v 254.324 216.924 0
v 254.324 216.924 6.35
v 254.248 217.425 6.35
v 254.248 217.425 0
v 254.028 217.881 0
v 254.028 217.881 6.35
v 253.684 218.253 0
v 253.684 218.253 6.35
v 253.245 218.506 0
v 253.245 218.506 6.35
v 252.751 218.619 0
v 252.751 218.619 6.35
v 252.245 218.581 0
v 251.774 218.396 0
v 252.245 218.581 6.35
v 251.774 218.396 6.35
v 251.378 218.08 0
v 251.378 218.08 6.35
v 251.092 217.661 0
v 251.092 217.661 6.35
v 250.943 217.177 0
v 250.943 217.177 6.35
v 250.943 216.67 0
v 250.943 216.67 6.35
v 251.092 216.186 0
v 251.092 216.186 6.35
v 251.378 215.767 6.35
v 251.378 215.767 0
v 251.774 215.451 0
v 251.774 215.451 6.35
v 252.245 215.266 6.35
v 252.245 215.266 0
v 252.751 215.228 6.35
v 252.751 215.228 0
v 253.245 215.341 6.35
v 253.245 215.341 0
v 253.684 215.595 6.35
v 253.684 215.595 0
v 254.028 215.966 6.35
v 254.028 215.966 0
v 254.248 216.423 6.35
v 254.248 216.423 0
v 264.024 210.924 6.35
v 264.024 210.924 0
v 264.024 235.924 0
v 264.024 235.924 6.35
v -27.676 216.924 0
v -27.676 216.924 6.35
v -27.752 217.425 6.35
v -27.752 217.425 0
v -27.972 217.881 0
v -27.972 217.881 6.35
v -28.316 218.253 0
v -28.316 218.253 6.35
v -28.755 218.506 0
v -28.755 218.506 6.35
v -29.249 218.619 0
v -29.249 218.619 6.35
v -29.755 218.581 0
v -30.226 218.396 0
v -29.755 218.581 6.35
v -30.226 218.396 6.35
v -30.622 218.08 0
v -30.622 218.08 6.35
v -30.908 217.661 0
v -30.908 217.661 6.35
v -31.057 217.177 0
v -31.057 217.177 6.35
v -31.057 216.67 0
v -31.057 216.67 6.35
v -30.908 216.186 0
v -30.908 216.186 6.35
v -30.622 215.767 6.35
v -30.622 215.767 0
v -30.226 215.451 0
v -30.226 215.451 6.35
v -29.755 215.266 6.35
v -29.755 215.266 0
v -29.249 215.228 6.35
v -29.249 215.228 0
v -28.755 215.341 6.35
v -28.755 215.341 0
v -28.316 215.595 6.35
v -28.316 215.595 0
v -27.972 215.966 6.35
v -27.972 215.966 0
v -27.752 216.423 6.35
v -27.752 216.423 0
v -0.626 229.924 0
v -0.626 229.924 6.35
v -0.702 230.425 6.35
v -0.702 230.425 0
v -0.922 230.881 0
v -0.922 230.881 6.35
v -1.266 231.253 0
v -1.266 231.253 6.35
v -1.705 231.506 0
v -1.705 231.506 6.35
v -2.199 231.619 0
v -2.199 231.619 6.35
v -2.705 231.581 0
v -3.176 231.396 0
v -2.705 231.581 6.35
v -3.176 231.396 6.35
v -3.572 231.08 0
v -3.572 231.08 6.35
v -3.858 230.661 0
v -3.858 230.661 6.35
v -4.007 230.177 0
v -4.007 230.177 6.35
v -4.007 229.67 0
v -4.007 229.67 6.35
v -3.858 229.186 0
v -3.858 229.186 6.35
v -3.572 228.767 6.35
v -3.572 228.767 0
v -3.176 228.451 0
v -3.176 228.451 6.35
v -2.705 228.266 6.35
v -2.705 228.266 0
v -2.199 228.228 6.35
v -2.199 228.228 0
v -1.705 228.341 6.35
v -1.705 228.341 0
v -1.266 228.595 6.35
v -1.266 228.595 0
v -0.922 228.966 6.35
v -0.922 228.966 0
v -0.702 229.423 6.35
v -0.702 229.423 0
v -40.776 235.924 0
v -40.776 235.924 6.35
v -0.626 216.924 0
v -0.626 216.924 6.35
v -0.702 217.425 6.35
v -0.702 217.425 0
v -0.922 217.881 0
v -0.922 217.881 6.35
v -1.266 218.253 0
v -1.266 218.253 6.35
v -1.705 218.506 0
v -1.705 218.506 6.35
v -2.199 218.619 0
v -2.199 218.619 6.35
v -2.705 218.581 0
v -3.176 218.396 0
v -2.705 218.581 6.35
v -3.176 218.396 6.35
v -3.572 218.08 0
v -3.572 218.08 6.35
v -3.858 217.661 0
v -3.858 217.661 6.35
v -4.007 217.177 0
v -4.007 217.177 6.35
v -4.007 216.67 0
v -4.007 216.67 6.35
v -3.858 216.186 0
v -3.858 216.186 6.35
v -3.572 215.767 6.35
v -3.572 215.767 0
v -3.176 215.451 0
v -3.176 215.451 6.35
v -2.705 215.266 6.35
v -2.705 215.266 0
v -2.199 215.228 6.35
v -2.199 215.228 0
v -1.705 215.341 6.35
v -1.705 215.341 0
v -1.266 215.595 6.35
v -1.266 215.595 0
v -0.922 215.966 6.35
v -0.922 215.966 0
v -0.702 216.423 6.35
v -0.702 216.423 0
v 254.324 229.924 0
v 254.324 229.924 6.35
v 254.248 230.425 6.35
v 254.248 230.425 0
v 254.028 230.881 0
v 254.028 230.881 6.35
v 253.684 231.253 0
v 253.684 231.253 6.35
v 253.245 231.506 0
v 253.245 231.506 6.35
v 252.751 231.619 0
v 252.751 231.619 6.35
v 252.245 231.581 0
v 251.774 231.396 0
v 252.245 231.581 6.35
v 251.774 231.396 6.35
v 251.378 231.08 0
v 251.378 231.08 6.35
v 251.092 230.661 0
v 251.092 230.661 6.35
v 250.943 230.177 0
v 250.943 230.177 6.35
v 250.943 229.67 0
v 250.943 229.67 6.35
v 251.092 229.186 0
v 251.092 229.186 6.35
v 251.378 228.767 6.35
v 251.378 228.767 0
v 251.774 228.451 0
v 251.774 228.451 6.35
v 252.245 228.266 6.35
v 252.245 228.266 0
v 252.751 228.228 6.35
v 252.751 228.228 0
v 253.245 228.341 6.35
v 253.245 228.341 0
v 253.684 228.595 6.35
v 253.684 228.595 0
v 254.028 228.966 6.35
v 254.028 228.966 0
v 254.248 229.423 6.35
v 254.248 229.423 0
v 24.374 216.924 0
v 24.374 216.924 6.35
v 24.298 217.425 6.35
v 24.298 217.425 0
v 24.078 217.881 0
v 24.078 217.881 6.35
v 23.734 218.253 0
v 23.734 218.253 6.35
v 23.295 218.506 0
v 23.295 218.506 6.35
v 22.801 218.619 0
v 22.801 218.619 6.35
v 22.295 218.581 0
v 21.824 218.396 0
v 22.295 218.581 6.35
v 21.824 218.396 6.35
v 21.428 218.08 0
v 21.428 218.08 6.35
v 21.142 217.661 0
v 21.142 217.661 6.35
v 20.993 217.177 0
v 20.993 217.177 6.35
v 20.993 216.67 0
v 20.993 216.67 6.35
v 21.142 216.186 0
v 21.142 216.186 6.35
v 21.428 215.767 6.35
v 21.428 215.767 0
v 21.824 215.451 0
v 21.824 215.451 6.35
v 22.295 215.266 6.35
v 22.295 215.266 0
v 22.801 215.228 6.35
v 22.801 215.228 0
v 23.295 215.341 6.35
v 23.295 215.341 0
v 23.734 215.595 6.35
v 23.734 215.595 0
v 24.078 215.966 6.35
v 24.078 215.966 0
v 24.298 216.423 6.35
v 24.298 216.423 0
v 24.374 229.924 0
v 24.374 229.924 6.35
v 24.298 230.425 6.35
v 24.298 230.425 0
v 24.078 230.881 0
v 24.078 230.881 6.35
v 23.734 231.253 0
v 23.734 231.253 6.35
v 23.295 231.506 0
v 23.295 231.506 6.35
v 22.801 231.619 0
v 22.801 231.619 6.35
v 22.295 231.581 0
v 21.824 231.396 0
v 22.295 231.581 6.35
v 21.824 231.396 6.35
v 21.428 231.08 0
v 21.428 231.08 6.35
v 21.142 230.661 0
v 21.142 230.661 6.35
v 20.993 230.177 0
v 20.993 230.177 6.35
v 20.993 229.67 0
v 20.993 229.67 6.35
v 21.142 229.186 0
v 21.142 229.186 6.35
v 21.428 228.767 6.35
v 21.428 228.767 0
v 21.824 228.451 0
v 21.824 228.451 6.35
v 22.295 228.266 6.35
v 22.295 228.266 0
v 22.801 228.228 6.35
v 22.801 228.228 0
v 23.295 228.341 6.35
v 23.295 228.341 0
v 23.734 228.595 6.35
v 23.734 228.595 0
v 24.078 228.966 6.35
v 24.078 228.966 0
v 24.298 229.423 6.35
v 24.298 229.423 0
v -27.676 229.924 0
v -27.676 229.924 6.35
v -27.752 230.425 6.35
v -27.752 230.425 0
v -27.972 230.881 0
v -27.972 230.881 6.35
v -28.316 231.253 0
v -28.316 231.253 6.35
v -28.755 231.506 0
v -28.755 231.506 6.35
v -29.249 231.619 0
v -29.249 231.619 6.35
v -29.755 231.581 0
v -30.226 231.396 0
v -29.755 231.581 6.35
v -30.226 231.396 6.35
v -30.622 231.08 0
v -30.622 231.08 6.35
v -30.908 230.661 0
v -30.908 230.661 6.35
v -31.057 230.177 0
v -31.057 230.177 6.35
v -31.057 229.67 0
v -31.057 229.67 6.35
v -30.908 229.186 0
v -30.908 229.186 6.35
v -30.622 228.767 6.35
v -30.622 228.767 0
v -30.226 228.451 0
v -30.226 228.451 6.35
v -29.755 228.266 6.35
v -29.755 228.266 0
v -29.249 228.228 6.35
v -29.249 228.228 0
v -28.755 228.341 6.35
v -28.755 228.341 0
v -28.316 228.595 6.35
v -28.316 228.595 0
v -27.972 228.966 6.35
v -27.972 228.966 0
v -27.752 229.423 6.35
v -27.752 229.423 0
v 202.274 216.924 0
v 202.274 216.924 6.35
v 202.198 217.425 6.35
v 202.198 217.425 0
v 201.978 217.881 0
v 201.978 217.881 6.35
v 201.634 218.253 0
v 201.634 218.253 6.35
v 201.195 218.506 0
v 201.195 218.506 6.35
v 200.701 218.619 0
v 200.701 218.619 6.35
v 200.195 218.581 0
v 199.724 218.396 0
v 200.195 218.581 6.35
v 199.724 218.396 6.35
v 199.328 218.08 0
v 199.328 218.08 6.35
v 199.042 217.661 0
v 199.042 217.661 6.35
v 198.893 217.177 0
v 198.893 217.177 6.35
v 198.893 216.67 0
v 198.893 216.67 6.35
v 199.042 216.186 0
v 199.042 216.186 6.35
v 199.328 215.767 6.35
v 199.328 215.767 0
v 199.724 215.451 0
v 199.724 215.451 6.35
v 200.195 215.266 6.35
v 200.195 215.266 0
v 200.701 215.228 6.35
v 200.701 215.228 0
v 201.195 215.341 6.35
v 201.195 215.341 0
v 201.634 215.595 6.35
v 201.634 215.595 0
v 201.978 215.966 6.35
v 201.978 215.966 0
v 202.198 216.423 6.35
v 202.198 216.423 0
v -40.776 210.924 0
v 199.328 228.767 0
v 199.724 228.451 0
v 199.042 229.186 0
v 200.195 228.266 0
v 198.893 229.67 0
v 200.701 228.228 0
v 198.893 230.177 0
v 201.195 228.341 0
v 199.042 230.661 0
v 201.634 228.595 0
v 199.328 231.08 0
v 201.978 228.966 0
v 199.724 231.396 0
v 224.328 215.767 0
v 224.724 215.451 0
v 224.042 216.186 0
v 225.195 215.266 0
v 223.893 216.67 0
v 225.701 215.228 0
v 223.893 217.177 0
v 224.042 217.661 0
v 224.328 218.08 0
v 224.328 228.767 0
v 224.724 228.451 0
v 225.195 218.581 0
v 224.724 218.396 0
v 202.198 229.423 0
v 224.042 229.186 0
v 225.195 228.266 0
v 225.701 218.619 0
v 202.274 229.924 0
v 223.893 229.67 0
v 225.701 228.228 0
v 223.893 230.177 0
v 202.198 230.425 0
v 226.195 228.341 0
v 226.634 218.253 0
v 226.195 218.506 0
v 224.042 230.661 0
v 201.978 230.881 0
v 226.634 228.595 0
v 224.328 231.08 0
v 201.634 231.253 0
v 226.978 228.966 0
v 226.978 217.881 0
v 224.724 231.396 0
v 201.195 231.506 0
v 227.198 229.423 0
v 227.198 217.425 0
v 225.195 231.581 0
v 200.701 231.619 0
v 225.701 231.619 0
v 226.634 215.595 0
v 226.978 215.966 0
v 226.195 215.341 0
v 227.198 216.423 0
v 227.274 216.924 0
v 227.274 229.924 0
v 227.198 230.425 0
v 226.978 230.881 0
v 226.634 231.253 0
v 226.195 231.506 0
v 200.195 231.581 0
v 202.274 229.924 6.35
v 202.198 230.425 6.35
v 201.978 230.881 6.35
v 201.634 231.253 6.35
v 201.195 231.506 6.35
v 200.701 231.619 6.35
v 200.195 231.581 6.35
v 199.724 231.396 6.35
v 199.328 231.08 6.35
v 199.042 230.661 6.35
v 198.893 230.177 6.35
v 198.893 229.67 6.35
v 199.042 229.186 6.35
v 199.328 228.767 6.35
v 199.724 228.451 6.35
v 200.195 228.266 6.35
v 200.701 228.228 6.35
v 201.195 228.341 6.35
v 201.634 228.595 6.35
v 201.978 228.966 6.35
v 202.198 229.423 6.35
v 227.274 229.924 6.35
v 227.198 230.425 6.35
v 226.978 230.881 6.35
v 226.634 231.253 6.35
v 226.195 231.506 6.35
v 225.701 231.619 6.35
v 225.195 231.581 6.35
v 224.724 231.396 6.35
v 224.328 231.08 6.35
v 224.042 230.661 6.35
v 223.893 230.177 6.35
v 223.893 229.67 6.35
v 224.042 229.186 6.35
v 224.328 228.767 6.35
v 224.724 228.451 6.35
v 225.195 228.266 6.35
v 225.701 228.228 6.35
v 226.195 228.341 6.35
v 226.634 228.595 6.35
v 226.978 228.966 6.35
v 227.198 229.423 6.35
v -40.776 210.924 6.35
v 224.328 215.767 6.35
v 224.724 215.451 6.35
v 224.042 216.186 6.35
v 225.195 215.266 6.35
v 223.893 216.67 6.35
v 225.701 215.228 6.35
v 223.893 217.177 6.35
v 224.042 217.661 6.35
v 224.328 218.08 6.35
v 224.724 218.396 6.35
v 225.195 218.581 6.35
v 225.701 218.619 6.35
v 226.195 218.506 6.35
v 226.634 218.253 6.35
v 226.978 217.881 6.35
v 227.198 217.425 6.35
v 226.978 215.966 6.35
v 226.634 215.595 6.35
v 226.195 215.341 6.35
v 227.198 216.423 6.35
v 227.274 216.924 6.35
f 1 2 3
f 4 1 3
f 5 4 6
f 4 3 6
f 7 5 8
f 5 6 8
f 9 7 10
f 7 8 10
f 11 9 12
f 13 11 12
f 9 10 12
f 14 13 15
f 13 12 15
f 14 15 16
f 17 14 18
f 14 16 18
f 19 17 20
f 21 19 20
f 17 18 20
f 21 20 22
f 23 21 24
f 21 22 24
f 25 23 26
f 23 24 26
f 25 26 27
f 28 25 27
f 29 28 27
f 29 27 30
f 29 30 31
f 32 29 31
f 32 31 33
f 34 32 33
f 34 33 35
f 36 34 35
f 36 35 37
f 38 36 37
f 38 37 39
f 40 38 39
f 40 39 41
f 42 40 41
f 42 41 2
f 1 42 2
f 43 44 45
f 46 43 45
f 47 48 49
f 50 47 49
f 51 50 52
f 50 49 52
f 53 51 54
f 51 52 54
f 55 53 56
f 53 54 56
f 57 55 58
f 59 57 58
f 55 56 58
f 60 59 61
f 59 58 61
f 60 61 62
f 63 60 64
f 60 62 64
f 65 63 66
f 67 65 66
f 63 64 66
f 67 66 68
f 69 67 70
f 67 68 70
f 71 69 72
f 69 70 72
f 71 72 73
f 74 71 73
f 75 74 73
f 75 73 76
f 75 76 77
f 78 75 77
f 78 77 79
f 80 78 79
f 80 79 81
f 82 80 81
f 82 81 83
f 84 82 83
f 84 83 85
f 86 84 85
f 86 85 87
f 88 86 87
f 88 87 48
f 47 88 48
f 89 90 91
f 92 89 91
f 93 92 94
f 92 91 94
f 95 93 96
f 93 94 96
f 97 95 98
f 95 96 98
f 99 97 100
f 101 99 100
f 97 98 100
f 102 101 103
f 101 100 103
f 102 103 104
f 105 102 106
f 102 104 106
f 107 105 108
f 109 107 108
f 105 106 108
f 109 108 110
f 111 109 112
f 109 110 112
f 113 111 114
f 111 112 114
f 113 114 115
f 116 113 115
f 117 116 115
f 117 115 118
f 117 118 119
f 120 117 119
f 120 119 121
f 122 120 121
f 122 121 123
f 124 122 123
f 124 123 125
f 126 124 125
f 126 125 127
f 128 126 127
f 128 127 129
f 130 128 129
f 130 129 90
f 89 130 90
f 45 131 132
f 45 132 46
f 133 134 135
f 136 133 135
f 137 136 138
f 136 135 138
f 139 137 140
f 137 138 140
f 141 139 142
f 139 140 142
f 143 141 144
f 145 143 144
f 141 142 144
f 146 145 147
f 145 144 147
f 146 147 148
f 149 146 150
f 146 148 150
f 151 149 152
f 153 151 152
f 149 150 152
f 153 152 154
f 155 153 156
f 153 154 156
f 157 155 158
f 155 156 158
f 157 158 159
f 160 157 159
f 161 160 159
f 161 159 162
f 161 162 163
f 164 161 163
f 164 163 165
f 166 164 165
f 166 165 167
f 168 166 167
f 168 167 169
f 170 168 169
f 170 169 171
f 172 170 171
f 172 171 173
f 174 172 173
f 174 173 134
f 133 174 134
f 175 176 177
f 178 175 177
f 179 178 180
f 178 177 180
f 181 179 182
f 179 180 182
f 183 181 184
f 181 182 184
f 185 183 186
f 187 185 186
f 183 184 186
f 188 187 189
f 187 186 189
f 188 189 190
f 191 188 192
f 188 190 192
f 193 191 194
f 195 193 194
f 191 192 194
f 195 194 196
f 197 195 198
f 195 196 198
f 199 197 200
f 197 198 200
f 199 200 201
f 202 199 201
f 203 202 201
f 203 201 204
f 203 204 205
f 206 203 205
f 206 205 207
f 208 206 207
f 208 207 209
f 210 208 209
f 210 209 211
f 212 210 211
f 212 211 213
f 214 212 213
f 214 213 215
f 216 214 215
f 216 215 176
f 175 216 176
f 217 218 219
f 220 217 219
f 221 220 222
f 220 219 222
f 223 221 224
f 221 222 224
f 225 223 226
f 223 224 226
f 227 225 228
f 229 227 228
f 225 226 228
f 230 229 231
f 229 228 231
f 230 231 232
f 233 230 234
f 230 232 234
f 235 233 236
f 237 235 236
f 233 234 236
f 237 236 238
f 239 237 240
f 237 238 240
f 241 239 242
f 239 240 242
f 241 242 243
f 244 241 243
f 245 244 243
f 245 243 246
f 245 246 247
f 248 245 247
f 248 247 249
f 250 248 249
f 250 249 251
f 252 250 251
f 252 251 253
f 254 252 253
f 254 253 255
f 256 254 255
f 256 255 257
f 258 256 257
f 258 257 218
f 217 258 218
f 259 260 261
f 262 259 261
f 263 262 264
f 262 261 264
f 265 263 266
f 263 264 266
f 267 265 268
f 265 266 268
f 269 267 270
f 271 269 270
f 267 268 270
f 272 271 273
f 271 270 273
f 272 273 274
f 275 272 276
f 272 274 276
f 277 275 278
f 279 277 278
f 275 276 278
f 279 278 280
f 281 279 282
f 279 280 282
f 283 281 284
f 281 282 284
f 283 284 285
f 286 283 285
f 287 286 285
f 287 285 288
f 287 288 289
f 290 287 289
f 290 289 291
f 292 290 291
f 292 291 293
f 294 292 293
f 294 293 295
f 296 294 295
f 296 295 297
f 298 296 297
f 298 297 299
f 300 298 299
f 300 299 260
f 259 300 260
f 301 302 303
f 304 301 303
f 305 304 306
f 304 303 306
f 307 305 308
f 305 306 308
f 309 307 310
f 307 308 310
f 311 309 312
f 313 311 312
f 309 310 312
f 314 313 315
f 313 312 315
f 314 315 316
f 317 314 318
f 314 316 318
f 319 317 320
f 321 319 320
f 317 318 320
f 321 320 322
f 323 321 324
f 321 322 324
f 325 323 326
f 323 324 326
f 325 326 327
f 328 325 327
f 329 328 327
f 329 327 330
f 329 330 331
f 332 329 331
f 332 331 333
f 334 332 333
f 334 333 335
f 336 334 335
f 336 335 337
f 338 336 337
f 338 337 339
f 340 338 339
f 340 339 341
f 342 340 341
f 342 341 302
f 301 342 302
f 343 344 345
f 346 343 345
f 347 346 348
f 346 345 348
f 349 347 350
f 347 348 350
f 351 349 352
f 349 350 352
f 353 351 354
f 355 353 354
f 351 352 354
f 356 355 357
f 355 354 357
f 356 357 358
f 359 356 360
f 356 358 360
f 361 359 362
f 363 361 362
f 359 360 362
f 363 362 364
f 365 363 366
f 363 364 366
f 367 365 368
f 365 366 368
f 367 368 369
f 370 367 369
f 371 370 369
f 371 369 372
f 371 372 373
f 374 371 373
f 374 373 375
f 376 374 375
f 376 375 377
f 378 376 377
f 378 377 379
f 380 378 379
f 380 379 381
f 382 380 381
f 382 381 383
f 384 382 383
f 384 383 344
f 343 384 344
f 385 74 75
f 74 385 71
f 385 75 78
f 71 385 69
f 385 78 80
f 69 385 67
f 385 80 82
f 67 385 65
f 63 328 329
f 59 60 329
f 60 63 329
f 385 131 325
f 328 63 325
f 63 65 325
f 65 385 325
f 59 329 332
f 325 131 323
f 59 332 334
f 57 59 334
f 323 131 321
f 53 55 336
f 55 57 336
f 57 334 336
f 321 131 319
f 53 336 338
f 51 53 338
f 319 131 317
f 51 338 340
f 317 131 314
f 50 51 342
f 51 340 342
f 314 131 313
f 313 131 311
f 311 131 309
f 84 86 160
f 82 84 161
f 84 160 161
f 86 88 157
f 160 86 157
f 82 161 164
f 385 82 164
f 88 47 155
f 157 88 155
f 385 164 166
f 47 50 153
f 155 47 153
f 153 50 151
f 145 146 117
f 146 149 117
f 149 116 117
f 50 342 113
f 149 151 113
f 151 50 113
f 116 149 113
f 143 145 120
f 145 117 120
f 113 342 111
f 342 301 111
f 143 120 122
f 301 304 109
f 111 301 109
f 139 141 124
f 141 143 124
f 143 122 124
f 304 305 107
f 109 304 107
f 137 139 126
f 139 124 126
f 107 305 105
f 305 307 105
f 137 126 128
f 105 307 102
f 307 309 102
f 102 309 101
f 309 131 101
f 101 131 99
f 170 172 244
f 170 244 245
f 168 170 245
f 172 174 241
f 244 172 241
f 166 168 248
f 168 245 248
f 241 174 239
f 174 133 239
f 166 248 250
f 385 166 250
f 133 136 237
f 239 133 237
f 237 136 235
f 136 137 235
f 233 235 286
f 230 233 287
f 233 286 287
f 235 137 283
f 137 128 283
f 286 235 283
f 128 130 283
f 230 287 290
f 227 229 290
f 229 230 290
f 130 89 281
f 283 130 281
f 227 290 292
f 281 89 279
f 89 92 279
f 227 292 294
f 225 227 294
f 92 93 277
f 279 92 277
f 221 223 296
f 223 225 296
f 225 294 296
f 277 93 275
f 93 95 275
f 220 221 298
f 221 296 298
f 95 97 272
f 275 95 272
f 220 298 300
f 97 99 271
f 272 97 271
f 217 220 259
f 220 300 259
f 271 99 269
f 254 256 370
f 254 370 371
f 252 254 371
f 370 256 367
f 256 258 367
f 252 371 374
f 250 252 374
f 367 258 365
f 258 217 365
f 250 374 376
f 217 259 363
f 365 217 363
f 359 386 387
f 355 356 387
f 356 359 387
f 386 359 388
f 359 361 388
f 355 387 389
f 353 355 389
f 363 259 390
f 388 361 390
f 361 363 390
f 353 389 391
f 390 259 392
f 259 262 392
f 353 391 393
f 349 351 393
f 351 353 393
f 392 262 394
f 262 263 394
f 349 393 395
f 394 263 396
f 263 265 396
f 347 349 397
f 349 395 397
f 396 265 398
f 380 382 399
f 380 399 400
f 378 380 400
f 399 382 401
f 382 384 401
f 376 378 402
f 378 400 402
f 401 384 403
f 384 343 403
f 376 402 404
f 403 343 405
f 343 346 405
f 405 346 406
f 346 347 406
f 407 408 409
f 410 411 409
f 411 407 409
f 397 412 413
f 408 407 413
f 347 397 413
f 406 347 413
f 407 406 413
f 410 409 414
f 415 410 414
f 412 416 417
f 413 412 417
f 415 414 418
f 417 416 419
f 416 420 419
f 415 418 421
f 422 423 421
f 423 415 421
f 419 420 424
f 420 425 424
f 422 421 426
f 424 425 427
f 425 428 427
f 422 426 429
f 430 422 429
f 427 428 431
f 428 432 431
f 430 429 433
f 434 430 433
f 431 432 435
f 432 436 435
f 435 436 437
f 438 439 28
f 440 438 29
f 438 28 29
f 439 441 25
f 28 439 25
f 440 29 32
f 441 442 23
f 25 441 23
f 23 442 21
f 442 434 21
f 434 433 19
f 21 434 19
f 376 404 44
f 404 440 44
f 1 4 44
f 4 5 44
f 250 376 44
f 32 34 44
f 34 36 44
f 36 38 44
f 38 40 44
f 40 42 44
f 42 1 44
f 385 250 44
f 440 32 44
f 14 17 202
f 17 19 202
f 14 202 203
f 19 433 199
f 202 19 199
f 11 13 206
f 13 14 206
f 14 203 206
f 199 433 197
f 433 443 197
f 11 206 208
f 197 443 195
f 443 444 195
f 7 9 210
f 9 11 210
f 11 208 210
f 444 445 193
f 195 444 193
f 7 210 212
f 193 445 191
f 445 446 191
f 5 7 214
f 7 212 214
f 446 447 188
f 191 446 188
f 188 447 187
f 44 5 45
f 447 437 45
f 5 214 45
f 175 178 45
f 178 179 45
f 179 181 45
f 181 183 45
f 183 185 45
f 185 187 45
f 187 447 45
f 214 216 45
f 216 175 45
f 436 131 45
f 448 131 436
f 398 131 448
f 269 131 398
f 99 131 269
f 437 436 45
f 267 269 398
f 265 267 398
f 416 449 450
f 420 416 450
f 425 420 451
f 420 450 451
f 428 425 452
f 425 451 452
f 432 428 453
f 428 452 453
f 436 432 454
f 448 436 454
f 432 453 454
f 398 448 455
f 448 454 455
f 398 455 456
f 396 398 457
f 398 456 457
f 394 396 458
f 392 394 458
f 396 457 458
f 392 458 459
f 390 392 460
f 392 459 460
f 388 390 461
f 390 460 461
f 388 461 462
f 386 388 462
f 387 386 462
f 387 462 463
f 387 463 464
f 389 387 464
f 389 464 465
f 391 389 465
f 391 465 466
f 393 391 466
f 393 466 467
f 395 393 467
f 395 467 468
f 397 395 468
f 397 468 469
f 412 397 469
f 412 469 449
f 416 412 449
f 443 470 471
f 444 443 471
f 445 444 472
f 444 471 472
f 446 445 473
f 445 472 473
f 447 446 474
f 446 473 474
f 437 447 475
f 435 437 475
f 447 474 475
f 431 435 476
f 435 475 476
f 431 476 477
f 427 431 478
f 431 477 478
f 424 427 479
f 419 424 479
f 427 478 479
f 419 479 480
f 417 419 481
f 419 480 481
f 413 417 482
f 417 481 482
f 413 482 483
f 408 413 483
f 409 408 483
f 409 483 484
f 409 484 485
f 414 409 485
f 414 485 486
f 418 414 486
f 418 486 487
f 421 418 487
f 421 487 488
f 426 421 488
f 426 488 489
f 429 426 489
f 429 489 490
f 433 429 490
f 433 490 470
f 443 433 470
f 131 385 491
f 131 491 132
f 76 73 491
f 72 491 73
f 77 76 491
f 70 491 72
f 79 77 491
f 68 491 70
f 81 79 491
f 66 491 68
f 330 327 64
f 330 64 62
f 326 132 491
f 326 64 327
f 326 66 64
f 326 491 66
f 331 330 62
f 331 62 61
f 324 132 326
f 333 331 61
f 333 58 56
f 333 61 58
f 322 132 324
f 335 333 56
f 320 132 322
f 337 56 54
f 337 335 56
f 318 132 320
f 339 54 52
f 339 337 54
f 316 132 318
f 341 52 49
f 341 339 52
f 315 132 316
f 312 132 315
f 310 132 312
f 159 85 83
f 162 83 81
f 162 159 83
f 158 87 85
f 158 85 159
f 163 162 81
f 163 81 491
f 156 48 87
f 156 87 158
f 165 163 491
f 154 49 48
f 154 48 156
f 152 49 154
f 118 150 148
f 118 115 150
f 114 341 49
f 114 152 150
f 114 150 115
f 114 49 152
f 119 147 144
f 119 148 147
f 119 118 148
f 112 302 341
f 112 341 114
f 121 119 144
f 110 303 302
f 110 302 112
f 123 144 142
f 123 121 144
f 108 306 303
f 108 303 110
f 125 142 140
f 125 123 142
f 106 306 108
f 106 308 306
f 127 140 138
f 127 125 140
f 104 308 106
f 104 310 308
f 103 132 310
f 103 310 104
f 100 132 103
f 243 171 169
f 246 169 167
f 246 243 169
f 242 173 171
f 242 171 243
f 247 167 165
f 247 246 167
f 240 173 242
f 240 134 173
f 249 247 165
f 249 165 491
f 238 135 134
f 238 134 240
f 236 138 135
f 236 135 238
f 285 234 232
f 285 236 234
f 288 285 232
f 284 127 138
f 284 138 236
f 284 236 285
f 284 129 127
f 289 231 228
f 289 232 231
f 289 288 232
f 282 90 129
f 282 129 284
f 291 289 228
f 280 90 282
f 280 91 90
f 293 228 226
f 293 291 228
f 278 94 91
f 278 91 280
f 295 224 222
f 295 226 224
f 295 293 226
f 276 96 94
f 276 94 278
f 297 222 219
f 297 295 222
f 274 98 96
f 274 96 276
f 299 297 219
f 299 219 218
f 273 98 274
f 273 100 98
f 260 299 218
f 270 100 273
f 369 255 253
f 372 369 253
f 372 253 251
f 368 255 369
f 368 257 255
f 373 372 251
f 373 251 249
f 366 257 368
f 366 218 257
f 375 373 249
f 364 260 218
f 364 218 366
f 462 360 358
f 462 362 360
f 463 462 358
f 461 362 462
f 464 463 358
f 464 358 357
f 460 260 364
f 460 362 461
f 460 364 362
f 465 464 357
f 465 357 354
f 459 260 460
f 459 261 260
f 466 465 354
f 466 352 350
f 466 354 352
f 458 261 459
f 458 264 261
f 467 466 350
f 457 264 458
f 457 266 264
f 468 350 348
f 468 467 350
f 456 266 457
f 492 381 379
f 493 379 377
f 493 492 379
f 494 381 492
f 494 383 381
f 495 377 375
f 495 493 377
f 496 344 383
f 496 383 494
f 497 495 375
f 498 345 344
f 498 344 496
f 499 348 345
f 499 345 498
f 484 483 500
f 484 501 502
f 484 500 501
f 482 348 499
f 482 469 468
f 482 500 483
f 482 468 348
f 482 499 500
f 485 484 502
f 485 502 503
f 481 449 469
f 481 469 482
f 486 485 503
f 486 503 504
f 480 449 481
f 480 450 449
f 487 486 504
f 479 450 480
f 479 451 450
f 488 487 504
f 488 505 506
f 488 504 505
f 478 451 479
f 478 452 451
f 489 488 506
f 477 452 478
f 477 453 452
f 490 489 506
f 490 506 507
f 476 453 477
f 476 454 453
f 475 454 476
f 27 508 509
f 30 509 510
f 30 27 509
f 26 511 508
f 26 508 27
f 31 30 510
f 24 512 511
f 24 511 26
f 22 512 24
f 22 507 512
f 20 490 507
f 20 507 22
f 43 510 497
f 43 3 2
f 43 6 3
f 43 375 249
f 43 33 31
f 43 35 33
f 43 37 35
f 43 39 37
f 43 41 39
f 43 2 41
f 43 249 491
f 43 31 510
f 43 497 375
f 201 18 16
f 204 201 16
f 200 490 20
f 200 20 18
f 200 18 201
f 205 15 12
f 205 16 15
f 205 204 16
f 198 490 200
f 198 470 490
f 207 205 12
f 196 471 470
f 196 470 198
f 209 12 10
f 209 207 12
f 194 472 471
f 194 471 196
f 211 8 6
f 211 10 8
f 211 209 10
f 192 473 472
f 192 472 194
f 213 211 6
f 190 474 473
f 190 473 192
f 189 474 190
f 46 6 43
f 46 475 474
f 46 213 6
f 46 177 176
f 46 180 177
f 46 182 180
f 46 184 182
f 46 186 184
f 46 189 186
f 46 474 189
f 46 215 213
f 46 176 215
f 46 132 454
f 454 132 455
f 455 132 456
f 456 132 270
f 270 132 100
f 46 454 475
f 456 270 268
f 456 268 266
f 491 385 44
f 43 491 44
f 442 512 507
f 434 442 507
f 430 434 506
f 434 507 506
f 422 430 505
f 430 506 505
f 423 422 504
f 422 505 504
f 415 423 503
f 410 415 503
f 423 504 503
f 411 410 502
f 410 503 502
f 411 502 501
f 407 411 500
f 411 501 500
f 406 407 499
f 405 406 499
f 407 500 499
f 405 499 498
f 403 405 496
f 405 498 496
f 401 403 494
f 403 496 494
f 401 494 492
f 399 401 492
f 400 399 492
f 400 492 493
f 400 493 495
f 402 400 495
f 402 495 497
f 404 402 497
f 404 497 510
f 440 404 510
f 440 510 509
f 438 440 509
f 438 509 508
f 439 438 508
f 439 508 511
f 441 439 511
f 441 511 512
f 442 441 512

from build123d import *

# Parameters (mm, degrees)
SKETCH1_W           = 304.8
SKETCH1_H           = 25
BOSS_EXTRUDE1_DEPTH = 6.35
SKETCH2_R           = 1.7
CUT_EXTRUDE1_DEPTH  = 30
SKETCH3_R           = 1.7
CUT_EXTRUDE2_DEPTH  = 21


with BuildPart() as part:
    # Sketch1 → Boss-Extrude1 (new body)
    with BuildSketch(Plane.XY):
        with Locations((111.623766163, 223.42362241)):
            Rectangle(SKETCH1_W, SKETCH1_H)
    extrude(amount=BOSS_EXTRUDE1_DEPTH)

    # Sketch2 → Cut-Extrude1 (cut)
    with BuildSketch(Plane.XY.offset(6.35)):
        with Locations((-2.326233838, 229.923622409)):
            Circle(SKETCH2_R)
        with Locations((-2.326233838, 216.923622409)):
            Circle(SKETCH2_R)
        with Locations((-29.376233838, 229.92362241)):
            Circle(SKETCH2_R)
        with Locations((-29.376233838, 216.92362241)):
            Circle(SKETCH2_R)
        with Locations((252.623766162, 229.923622411)):
            Circle(SKETCH2_R)
        with Locations((252.623766162, 216.923622411)):
            Circle(SKETCH2_R)
        with Locations((225.573766162, 229.92362241)):
            Circle(SKETCH2_R)
        with Locations((225.573766162, 216.92362241)):
            Circle(SKETCH2_R)
    extrude(amount=-CUT_EXTRUDE1_DEPTH, mode=Mode.SUBTRACT)

    # Sketch3 → Cut-Extrude2 (cut)
    with BuildSketch(Plane.XY.offset(6.35)):
        with Locations((22.673766162, 216.923622409)):
            Circle(SKETCH3_R)
        with Locations((22.673766162, 229.923622409)):
            Circle(SKETCH3_R)
        with Locations((200.573766162, 216.92362241)):
            Circle(SKETCH3_R)
        with Locations((200.573766162, 229.92362241)):
            Circle(SKETCH3_R)
    extrude(amount=-CUT_EXTRUDE2_DEPTH, mode=Mode.SUBTRACT)


solid = part.part
